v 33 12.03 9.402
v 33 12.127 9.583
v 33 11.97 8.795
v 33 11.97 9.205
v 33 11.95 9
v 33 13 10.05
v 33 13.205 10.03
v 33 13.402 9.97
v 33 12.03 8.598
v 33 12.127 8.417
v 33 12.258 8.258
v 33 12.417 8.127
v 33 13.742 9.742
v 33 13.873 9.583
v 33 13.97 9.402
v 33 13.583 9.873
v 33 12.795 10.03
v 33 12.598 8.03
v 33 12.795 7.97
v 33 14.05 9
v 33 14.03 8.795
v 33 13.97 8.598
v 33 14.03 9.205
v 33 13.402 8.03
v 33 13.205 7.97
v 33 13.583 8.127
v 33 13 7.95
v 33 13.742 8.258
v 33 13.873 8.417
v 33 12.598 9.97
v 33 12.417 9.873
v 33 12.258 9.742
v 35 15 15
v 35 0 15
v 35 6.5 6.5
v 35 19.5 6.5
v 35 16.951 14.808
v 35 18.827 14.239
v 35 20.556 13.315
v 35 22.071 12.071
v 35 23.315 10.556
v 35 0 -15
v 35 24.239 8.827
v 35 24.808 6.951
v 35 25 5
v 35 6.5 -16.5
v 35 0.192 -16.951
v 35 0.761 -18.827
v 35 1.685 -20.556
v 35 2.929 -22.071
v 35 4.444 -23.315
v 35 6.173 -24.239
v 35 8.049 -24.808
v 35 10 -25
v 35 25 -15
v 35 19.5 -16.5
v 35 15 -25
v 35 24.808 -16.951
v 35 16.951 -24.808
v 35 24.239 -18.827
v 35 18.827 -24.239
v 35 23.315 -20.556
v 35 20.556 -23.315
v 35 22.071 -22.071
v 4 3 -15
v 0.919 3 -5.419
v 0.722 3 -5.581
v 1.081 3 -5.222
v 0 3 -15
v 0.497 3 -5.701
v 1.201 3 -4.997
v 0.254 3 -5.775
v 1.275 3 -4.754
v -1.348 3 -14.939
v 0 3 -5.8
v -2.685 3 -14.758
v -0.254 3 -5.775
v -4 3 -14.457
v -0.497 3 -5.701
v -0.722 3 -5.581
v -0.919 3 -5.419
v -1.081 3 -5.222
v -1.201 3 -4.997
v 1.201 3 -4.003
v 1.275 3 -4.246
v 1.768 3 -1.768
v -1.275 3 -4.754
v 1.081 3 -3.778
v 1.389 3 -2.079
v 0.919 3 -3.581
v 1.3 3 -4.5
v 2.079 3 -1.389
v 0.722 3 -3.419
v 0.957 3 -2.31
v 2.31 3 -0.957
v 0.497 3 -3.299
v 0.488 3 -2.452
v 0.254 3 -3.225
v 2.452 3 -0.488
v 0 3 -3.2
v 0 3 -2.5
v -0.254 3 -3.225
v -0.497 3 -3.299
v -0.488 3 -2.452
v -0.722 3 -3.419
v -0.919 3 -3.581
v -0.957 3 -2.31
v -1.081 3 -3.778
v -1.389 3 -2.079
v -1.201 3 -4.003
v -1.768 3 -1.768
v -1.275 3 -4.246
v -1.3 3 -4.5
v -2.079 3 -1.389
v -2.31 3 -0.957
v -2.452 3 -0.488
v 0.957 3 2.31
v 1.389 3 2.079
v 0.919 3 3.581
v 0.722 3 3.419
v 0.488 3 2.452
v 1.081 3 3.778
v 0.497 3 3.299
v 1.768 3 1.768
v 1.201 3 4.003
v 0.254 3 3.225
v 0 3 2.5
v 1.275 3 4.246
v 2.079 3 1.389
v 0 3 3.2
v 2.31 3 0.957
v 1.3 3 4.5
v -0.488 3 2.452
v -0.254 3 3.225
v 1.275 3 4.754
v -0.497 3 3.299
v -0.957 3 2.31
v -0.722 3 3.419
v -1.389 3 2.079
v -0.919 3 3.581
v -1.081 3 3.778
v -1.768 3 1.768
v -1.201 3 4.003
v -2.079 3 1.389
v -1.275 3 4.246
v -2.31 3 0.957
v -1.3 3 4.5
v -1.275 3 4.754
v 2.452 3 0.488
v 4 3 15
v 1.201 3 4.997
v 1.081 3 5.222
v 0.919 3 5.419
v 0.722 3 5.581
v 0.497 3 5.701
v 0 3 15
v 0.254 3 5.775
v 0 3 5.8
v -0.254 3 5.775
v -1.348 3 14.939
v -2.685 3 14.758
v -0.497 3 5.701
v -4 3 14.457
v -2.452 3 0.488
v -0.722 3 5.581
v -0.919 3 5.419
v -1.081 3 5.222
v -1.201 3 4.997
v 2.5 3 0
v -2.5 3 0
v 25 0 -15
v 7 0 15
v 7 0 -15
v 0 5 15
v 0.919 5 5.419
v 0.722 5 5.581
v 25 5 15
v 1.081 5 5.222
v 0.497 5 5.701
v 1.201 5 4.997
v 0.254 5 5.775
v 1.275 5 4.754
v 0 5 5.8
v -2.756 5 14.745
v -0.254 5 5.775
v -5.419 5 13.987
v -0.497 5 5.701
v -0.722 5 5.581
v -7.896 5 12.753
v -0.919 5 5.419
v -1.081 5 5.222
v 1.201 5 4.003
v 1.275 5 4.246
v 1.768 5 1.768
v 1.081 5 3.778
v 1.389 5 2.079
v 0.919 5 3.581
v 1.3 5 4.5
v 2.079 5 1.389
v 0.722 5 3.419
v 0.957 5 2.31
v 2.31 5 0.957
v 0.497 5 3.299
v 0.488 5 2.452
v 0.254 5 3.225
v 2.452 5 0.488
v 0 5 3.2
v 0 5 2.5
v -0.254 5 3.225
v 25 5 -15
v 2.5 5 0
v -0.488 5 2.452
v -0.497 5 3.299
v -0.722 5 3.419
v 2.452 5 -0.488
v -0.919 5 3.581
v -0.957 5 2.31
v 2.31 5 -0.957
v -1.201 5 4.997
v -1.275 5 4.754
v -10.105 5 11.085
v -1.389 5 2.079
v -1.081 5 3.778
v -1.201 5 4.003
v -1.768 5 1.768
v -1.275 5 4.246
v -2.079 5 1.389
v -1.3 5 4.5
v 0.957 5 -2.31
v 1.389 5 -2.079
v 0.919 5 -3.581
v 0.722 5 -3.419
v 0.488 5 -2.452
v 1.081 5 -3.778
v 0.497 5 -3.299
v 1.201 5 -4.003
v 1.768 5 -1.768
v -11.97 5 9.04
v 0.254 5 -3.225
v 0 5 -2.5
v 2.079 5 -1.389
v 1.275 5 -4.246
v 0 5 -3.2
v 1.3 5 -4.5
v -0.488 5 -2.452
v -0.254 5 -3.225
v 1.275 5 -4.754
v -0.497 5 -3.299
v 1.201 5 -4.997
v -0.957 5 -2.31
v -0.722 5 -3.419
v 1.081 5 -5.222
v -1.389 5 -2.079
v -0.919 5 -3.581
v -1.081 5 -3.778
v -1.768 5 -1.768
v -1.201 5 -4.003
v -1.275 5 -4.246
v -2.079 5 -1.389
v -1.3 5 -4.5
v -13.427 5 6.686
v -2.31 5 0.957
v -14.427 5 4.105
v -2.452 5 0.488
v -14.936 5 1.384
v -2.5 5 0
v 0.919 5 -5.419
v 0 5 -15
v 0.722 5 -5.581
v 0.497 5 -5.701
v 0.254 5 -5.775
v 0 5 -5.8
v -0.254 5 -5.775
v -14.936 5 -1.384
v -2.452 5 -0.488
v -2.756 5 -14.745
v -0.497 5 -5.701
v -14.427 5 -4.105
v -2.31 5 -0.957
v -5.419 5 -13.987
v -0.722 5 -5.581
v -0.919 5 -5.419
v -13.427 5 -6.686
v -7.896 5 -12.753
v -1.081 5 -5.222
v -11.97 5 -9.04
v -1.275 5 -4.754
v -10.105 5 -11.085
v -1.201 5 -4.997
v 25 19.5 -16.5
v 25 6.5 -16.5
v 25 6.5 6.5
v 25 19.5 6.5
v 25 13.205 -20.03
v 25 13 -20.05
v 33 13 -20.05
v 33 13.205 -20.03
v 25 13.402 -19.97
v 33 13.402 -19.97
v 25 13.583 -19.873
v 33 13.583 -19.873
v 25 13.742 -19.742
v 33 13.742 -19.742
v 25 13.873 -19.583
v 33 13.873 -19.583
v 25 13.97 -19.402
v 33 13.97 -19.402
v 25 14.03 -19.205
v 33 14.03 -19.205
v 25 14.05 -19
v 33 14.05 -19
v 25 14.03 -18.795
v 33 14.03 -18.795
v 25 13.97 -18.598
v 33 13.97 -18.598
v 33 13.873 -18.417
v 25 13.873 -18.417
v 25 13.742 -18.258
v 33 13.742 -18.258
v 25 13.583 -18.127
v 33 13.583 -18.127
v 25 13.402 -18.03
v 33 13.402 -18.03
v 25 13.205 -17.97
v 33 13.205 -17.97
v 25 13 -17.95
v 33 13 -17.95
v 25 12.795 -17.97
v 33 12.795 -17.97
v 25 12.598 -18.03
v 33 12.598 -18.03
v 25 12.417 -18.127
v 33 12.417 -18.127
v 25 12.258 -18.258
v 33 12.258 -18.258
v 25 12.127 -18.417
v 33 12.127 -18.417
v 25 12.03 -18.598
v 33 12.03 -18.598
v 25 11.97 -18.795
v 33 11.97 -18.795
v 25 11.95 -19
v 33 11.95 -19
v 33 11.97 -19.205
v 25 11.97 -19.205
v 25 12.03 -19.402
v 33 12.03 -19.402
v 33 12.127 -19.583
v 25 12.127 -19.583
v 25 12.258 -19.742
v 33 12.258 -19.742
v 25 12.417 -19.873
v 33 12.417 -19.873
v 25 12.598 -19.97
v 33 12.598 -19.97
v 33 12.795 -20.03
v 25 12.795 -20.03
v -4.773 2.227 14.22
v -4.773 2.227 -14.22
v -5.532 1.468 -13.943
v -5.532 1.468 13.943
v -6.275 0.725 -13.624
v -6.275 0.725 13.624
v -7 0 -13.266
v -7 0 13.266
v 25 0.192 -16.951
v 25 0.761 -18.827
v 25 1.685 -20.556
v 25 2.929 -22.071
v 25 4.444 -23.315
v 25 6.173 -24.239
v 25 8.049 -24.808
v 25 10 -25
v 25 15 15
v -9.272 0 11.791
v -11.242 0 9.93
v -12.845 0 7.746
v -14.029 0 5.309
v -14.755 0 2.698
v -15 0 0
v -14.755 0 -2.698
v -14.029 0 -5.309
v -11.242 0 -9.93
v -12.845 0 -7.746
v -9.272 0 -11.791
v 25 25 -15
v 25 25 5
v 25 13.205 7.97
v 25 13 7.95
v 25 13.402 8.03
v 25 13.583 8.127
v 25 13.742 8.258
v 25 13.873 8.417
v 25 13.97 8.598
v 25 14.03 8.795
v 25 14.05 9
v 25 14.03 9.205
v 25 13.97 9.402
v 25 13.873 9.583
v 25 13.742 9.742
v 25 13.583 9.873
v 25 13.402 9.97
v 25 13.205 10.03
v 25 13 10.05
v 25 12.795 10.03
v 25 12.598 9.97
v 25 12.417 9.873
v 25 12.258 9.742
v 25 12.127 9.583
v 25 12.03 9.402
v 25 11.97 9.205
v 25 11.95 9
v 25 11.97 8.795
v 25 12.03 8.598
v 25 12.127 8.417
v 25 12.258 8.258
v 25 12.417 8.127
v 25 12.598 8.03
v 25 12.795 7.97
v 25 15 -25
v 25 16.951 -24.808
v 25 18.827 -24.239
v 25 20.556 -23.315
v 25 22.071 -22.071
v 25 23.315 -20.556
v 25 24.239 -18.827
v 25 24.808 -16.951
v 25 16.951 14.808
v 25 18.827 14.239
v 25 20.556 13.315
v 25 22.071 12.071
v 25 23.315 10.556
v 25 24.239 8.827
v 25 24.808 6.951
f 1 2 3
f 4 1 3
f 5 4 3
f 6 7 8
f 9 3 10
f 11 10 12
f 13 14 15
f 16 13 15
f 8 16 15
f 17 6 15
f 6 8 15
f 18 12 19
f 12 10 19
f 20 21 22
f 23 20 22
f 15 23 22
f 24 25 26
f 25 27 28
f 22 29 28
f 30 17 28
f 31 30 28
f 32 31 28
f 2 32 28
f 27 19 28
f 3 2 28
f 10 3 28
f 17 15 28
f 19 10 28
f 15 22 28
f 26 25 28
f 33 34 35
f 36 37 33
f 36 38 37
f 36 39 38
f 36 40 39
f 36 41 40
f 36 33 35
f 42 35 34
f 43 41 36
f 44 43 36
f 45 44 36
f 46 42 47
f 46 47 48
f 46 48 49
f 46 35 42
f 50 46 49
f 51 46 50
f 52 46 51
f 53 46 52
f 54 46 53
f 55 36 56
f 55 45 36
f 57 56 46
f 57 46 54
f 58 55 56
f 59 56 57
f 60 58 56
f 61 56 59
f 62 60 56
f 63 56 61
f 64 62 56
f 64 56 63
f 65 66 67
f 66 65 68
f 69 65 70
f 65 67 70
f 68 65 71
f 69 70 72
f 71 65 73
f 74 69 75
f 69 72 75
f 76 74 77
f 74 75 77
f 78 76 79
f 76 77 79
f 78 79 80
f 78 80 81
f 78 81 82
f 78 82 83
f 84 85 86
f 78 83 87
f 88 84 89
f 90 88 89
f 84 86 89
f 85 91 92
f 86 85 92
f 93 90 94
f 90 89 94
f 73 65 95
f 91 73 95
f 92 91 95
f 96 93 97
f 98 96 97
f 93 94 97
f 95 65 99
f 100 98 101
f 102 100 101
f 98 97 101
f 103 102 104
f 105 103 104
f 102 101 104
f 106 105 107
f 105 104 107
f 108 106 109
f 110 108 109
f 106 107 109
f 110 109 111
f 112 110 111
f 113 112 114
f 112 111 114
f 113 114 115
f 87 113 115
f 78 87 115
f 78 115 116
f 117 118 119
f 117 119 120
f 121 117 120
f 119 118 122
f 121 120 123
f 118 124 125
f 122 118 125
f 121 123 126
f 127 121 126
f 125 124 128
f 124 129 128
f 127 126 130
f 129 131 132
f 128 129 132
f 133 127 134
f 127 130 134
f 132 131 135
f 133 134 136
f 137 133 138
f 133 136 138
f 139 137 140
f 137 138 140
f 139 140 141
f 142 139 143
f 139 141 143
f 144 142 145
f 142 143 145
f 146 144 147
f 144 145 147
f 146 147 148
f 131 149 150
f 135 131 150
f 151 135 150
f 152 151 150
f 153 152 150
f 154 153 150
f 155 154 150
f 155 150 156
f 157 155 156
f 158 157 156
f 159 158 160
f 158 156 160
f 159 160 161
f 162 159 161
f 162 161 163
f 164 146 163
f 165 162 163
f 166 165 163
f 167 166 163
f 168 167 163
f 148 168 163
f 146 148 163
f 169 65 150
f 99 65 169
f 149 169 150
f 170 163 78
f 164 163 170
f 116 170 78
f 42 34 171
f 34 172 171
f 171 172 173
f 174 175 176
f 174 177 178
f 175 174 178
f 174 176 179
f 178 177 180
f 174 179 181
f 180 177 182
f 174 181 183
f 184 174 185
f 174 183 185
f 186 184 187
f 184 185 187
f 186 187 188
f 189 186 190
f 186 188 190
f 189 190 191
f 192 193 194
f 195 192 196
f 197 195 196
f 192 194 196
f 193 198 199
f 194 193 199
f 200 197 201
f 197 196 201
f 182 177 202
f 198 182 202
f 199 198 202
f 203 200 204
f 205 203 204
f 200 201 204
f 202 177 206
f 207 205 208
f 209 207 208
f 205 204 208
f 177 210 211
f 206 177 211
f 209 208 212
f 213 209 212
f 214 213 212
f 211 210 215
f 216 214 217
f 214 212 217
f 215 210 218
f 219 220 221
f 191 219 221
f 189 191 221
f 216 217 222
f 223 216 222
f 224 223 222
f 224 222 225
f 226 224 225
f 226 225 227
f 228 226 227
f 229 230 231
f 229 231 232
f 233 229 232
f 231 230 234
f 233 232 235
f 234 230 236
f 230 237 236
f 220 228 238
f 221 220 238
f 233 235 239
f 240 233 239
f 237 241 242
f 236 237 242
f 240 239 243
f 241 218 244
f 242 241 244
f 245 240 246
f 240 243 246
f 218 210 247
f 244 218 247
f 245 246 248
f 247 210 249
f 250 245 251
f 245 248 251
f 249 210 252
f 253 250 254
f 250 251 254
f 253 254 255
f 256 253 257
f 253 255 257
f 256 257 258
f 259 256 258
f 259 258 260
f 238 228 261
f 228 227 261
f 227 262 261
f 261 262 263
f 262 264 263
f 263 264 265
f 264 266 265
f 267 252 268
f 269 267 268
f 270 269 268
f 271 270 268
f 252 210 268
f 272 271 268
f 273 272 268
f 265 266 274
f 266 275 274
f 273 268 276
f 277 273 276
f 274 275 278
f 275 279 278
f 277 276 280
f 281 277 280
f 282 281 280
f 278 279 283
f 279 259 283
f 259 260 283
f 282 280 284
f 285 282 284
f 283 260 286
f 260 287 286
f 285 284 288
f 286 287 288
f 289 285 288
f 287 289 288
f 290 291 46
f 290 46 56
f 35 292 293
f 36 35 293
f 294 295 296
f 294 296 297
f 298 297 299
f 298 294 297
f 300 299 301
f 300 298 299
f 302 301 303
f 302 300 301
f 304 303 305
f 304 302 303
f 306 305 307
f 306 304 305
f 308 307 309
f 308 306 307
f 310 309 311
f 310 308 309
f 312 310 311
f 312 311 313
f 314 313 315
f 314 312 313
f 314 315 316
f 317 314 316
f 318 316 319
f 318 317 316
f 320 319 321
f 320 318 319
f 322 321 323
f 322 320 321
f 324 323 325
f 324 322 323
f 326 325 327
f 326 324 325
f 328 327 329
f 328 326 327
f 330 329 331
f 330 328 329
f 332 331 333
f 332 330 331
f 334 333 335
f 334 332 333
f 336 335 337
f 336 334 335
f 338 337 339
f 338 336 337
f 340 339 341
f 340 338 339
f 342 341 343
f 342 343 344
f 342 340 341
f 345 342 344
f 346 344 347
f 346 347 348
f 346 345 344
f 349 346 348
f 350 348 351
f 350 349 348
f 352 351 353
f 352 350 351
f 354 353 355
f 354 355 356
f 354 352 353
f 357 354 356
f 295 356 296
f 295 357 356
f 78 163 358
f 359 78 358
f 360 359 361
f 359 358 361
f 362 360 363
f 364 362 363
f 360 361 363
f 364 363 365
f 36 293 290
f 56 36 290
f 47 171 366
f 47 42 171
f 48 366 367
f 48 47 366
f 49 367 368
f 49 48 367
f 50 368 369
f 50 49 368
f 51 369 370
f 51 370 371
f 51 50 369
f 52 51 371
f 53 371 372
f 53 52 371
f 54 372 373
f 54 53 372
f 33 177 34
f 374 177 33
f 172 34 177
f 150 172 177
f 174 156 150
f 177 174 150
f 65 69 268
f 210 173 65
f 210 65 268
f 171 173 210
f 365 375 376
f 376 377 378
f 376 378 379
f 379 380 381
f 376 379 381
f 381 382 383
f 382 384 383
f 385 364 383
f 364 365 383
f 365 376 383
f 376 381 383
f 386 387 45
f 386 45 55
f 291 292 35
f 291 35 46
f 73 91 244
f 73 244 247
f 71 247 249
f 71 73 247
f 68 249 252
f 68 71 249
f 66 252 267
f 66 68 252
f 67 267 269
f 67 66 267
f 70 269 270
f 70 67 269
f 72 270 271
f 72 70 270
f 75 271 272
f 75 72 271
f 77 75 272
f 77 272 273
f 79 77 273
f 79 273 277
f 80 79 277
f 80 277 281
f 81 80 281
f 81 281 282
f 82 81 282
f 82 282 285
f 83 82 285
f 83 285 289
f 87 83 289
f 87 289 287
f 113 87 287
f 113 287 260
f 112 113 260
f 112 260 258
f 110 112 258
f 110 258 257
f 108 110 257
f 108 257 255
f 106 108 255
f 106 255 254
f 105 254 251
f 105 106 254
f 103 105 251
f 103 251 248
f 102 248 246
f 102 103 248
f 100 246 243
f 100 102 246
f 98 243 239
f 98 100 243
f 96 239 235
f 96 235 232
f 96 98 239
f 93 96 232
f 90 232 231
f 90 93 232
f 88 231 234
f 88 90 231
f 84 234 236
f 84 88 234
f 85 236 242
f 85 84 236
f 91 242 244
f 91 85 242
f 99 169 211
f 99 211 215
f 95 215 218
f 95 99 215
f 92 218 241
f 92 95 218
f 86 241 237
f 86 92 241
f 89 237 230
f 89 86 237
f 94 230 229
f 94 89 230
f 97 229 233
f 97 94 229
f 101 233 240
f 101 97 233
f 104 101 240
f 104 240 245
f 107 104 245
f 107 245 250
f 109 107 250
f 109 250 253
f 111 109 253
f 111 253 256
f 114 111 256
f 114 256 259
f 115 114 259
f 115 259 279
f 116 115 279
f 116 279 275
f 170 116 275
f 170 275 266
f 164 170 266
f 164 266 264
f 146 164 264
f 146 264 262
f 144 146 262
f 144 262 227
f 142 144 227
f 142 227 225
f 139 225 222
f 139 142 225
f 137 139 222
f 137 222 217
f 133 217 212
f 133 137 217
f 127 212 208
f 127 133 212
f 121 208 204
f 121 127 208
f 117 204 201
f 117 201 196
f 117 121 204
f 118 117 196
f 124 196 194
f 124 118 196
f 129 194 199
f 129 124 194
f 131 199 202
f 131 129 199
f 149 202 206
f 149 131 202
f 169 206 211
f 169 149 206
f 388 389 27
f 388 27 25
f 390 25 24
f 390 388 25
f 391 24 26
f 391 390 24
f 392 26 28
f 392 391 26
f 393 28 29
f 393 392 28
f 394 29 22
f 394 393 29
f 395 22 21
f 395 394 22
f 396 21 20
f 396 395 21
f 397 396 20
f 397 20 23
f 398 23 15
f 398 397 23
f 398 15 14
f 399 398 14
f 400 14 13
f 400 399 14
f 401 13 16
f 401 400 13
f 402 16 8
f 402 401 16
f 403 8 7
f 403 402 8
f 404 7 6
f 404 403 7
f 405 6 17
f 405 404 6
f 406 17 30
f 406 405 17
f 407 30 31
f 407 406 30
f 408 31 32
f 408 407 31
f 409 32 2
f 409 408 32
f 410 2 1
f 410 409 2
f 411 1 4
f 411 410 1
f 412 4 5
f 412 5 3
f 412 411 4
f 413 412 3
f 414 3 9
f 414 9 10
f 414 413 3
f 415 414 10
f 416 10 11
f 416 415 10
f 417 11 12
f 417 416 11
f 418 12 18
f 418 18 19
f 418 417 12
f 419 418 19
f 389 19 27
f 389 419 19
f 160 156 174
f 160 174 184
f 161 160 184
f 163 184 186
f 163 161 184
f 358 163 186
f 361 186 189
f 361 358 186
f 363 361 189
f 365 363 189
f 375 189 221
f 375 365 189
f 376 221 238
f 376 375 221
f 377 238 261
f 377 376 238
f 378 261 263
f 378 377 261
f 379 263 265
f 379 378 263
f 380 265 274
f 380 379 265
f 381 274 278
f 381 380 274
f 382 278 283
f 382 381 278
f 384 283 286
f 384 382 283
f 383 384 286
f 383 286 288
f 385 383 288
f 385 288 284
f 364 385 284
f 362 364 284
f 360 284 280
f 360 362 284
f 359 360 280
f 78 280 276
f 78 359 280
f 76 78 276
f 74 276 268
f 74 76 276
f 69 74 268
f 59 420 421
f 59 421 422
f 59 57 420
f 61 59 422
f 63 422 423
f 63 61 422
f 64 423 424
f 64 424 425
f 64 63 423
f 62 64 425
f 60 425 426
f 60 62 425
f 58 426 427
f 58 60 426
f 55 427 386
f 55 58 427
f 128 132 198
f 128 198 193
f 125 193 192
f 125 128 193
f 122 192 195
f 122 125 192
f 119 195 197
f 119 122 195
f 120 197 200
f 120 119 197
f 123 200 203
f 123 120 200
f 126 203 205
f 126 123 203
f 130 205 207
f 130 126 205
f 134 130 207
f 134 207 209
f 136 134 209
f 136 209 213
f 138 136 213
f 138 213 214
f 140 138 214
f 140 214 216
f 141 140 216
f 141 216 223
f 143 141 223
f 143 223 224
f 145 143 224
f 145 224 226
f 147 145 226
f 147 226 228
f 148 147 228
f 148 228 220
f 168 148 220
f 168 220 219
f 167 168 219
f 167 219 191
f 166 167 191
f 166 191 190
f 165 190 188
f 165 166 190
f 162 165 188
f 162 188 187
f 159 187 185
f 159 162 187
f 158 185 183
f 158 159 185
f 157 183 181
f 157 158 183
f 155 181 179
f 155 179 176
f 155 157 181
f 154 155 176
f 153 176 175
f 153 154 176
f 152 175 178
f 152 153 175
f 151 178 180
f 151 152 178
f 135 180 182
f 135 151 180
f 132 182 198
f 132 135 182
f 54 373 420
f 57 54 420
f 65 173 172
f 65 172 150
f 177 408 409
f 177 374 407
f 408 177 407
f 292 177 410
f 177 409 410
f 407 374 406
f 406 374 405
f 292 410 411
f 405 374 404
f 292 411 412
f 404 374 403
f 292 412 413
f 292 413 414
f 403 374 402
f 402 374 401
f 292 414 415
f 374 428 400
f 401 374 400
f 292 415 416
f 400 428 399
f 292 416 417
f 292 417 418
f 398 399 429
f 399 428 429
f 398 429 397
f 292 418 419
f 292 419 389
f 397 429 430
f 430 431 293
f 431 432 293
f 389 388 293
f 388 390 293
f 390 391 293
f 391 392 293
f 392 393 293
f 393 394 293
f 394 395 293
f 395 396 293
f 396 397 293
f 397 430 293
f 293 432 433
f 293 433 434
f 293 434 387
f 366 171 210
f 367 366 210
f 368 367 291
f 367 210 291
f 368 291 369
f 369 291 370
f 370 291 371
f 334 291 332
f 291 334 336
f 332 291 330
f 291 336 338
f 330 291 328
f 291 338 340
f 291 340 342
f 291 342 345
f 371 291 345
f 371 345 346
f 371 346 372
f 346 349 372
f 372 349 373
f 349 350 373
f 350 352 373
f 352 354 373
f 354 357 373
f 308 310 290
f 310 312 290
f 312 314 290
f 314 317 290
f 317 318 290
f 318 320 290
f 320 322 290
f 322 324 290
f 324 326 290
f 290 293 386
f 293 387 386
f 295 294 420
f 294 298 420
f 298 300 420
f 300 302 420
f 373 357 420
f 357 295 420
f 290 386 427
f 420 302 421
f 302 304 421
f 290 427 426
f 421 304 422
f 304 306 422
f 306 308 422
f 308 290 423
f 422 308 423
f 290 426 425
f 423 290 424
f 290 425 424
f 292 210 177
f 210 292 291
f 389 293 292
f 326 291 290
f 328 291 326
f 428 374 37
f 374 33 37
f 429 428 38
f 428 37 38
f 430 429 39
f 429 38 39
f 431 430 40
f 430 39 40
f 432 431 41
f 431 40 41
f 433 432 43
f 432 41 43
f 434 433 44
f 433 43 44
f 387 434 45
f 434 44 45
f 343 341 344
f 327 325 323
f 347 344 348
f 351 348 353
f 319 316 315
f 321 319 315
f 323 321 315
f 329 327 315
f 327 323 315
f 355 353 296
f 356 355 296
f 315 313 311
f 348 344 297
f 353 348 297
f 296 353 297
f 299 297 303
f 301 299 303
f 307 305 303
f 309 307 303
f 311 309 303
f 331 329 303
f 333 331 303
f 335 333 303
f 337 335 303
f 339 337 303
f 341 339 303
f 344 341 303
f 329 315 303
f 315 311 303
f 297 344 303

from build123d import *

# Parameters (mm, degrees)
SKETCH1_R           = 2.5
SKETCH1_R_2         = 1.3
BOSS_EXTRUDE1_DEPTH = 5
SKETCH2_W           = 40
SKETCH2_H           = 25
BOSS_EXTRUDE2_DEPTH = 10
SKETCH3_W           = 23
SKETCH3_H           = 13
CUT_EXTRUDE1_DEPTH  = 8
SKETCH3_3_R         = 1.05
CUT_EXTRUDE2_DEPTH  = 8
SKETCH3_4_W         = 23
SKETCH3_4_H         = 13
CUT_EXTRUDE3_DEPTH  = 11
FILLET1_R           = 10
CUT_EXTRUDE4_DEPTH  = 41


with BuildPart() as part:
    # Sketch1 → Boss-Extrude1 (new body)
    with BuildSketch(Plane(origin=(0, 0, 0), x_dir=(1, 0, 0), z_dir=(0, 1, 0))):
        with BuildLine():
            Line((0, 15), (25, 15))
            Line((25, 15), (25, -15))
            Line((25, -15), (0, -15))
            ThreePointArc((0, -15), (-15, 0), (0, 15))
        make_face()
        Circle(SKETCH1_R, mode=Mode.SUBTRACT)
        with Locations((0, -4.5)):
            Circle(SKETCH1_R_2, mode=Mode.SUBTRACT)
        with Locations((0, 4.5)):
            Circle(SKETCH1_R_2, mode=Mode.SUBTRACT)
    extrude(amount=BOSS_EXTRUDE1_DEPTH)

    # Sketch2 → Boss-Extrude2 (add)
    with BuildSketch(Plane(origin=(25, 0, 0), x_dir=(0, 0, -1), z_dir=(1, 0, 0))):
        with Locations((5, 12.5)):
            Rectangle(SKETCH2_W, SKETCH2_H)
    extrude(amount=BOSS_EXTRUDE2_DEPTH)

    # Sketch3 → Cut-Extrude1 (cut)
    with BuildSketch(Plane(origin=(25, 0, 0), x_dir=(0, 0, -1), z_dir=(1, 0, 0))):
        with Locations((5, 13)):
            Rectangle(SKETCH3_W, SKETCH3_H)
    extrude(amount=CUT_EXTRUDE1_DEPTH, mode=Mode.SUBTRACT)

    # Sketch3<3> → Cut-Extrude2 (cut)
    with BuildSketch(Plane(origin=(25, 0, 0), x_dir=(0, 0, -1), z_dir=(1, 0, 0))):
        with Locations((-9, 13)):
            Circle(SKETCH3_3_R)
        with Locations((19, 13)):
            Circle(SKETCH3_3_R)
    extrude(amount=CUT_EXTRUDE2_DEPTH, mode=Mode.SUBTRACT)

    # Sketch3<4> → Cut-Extrude3 (cut, through all)
    with BuildSketch(Plane(origin=(25, 0, 0), x_dir=(0, 0, -1), z_dir=(1, 0, 0))):
        with Locations((5, 13)):
            Rectangle(SKETCH3_4_W, SKETCH3_4_H)
    extrude(amount=CUT_EXTRUDE3_DEPTH, mode=Mode.SUBTRACT)

    # Fillet1
    fillet1_edges = [part.edges().sort_by_distance(p)[0] for p in [
        (30, 0, -25),
        (30, 25, -25),
        (30, 25, 15),
    ]]
    fillet(fillet1_edges, radius=FILLET1_R)

    # Sketch4 → Cut-Extrude4 (cut, through all)
    with BuildSketch(Plane.XY.offset(15)):
        Polygon((7, 0), (4, 3), (-4, 3), (-7, 0), align=None)
    extrude(amount=-CUT_EXTRUDE4_DEPTH, mode=Mode.SUBTRACT)


solid = part.part
